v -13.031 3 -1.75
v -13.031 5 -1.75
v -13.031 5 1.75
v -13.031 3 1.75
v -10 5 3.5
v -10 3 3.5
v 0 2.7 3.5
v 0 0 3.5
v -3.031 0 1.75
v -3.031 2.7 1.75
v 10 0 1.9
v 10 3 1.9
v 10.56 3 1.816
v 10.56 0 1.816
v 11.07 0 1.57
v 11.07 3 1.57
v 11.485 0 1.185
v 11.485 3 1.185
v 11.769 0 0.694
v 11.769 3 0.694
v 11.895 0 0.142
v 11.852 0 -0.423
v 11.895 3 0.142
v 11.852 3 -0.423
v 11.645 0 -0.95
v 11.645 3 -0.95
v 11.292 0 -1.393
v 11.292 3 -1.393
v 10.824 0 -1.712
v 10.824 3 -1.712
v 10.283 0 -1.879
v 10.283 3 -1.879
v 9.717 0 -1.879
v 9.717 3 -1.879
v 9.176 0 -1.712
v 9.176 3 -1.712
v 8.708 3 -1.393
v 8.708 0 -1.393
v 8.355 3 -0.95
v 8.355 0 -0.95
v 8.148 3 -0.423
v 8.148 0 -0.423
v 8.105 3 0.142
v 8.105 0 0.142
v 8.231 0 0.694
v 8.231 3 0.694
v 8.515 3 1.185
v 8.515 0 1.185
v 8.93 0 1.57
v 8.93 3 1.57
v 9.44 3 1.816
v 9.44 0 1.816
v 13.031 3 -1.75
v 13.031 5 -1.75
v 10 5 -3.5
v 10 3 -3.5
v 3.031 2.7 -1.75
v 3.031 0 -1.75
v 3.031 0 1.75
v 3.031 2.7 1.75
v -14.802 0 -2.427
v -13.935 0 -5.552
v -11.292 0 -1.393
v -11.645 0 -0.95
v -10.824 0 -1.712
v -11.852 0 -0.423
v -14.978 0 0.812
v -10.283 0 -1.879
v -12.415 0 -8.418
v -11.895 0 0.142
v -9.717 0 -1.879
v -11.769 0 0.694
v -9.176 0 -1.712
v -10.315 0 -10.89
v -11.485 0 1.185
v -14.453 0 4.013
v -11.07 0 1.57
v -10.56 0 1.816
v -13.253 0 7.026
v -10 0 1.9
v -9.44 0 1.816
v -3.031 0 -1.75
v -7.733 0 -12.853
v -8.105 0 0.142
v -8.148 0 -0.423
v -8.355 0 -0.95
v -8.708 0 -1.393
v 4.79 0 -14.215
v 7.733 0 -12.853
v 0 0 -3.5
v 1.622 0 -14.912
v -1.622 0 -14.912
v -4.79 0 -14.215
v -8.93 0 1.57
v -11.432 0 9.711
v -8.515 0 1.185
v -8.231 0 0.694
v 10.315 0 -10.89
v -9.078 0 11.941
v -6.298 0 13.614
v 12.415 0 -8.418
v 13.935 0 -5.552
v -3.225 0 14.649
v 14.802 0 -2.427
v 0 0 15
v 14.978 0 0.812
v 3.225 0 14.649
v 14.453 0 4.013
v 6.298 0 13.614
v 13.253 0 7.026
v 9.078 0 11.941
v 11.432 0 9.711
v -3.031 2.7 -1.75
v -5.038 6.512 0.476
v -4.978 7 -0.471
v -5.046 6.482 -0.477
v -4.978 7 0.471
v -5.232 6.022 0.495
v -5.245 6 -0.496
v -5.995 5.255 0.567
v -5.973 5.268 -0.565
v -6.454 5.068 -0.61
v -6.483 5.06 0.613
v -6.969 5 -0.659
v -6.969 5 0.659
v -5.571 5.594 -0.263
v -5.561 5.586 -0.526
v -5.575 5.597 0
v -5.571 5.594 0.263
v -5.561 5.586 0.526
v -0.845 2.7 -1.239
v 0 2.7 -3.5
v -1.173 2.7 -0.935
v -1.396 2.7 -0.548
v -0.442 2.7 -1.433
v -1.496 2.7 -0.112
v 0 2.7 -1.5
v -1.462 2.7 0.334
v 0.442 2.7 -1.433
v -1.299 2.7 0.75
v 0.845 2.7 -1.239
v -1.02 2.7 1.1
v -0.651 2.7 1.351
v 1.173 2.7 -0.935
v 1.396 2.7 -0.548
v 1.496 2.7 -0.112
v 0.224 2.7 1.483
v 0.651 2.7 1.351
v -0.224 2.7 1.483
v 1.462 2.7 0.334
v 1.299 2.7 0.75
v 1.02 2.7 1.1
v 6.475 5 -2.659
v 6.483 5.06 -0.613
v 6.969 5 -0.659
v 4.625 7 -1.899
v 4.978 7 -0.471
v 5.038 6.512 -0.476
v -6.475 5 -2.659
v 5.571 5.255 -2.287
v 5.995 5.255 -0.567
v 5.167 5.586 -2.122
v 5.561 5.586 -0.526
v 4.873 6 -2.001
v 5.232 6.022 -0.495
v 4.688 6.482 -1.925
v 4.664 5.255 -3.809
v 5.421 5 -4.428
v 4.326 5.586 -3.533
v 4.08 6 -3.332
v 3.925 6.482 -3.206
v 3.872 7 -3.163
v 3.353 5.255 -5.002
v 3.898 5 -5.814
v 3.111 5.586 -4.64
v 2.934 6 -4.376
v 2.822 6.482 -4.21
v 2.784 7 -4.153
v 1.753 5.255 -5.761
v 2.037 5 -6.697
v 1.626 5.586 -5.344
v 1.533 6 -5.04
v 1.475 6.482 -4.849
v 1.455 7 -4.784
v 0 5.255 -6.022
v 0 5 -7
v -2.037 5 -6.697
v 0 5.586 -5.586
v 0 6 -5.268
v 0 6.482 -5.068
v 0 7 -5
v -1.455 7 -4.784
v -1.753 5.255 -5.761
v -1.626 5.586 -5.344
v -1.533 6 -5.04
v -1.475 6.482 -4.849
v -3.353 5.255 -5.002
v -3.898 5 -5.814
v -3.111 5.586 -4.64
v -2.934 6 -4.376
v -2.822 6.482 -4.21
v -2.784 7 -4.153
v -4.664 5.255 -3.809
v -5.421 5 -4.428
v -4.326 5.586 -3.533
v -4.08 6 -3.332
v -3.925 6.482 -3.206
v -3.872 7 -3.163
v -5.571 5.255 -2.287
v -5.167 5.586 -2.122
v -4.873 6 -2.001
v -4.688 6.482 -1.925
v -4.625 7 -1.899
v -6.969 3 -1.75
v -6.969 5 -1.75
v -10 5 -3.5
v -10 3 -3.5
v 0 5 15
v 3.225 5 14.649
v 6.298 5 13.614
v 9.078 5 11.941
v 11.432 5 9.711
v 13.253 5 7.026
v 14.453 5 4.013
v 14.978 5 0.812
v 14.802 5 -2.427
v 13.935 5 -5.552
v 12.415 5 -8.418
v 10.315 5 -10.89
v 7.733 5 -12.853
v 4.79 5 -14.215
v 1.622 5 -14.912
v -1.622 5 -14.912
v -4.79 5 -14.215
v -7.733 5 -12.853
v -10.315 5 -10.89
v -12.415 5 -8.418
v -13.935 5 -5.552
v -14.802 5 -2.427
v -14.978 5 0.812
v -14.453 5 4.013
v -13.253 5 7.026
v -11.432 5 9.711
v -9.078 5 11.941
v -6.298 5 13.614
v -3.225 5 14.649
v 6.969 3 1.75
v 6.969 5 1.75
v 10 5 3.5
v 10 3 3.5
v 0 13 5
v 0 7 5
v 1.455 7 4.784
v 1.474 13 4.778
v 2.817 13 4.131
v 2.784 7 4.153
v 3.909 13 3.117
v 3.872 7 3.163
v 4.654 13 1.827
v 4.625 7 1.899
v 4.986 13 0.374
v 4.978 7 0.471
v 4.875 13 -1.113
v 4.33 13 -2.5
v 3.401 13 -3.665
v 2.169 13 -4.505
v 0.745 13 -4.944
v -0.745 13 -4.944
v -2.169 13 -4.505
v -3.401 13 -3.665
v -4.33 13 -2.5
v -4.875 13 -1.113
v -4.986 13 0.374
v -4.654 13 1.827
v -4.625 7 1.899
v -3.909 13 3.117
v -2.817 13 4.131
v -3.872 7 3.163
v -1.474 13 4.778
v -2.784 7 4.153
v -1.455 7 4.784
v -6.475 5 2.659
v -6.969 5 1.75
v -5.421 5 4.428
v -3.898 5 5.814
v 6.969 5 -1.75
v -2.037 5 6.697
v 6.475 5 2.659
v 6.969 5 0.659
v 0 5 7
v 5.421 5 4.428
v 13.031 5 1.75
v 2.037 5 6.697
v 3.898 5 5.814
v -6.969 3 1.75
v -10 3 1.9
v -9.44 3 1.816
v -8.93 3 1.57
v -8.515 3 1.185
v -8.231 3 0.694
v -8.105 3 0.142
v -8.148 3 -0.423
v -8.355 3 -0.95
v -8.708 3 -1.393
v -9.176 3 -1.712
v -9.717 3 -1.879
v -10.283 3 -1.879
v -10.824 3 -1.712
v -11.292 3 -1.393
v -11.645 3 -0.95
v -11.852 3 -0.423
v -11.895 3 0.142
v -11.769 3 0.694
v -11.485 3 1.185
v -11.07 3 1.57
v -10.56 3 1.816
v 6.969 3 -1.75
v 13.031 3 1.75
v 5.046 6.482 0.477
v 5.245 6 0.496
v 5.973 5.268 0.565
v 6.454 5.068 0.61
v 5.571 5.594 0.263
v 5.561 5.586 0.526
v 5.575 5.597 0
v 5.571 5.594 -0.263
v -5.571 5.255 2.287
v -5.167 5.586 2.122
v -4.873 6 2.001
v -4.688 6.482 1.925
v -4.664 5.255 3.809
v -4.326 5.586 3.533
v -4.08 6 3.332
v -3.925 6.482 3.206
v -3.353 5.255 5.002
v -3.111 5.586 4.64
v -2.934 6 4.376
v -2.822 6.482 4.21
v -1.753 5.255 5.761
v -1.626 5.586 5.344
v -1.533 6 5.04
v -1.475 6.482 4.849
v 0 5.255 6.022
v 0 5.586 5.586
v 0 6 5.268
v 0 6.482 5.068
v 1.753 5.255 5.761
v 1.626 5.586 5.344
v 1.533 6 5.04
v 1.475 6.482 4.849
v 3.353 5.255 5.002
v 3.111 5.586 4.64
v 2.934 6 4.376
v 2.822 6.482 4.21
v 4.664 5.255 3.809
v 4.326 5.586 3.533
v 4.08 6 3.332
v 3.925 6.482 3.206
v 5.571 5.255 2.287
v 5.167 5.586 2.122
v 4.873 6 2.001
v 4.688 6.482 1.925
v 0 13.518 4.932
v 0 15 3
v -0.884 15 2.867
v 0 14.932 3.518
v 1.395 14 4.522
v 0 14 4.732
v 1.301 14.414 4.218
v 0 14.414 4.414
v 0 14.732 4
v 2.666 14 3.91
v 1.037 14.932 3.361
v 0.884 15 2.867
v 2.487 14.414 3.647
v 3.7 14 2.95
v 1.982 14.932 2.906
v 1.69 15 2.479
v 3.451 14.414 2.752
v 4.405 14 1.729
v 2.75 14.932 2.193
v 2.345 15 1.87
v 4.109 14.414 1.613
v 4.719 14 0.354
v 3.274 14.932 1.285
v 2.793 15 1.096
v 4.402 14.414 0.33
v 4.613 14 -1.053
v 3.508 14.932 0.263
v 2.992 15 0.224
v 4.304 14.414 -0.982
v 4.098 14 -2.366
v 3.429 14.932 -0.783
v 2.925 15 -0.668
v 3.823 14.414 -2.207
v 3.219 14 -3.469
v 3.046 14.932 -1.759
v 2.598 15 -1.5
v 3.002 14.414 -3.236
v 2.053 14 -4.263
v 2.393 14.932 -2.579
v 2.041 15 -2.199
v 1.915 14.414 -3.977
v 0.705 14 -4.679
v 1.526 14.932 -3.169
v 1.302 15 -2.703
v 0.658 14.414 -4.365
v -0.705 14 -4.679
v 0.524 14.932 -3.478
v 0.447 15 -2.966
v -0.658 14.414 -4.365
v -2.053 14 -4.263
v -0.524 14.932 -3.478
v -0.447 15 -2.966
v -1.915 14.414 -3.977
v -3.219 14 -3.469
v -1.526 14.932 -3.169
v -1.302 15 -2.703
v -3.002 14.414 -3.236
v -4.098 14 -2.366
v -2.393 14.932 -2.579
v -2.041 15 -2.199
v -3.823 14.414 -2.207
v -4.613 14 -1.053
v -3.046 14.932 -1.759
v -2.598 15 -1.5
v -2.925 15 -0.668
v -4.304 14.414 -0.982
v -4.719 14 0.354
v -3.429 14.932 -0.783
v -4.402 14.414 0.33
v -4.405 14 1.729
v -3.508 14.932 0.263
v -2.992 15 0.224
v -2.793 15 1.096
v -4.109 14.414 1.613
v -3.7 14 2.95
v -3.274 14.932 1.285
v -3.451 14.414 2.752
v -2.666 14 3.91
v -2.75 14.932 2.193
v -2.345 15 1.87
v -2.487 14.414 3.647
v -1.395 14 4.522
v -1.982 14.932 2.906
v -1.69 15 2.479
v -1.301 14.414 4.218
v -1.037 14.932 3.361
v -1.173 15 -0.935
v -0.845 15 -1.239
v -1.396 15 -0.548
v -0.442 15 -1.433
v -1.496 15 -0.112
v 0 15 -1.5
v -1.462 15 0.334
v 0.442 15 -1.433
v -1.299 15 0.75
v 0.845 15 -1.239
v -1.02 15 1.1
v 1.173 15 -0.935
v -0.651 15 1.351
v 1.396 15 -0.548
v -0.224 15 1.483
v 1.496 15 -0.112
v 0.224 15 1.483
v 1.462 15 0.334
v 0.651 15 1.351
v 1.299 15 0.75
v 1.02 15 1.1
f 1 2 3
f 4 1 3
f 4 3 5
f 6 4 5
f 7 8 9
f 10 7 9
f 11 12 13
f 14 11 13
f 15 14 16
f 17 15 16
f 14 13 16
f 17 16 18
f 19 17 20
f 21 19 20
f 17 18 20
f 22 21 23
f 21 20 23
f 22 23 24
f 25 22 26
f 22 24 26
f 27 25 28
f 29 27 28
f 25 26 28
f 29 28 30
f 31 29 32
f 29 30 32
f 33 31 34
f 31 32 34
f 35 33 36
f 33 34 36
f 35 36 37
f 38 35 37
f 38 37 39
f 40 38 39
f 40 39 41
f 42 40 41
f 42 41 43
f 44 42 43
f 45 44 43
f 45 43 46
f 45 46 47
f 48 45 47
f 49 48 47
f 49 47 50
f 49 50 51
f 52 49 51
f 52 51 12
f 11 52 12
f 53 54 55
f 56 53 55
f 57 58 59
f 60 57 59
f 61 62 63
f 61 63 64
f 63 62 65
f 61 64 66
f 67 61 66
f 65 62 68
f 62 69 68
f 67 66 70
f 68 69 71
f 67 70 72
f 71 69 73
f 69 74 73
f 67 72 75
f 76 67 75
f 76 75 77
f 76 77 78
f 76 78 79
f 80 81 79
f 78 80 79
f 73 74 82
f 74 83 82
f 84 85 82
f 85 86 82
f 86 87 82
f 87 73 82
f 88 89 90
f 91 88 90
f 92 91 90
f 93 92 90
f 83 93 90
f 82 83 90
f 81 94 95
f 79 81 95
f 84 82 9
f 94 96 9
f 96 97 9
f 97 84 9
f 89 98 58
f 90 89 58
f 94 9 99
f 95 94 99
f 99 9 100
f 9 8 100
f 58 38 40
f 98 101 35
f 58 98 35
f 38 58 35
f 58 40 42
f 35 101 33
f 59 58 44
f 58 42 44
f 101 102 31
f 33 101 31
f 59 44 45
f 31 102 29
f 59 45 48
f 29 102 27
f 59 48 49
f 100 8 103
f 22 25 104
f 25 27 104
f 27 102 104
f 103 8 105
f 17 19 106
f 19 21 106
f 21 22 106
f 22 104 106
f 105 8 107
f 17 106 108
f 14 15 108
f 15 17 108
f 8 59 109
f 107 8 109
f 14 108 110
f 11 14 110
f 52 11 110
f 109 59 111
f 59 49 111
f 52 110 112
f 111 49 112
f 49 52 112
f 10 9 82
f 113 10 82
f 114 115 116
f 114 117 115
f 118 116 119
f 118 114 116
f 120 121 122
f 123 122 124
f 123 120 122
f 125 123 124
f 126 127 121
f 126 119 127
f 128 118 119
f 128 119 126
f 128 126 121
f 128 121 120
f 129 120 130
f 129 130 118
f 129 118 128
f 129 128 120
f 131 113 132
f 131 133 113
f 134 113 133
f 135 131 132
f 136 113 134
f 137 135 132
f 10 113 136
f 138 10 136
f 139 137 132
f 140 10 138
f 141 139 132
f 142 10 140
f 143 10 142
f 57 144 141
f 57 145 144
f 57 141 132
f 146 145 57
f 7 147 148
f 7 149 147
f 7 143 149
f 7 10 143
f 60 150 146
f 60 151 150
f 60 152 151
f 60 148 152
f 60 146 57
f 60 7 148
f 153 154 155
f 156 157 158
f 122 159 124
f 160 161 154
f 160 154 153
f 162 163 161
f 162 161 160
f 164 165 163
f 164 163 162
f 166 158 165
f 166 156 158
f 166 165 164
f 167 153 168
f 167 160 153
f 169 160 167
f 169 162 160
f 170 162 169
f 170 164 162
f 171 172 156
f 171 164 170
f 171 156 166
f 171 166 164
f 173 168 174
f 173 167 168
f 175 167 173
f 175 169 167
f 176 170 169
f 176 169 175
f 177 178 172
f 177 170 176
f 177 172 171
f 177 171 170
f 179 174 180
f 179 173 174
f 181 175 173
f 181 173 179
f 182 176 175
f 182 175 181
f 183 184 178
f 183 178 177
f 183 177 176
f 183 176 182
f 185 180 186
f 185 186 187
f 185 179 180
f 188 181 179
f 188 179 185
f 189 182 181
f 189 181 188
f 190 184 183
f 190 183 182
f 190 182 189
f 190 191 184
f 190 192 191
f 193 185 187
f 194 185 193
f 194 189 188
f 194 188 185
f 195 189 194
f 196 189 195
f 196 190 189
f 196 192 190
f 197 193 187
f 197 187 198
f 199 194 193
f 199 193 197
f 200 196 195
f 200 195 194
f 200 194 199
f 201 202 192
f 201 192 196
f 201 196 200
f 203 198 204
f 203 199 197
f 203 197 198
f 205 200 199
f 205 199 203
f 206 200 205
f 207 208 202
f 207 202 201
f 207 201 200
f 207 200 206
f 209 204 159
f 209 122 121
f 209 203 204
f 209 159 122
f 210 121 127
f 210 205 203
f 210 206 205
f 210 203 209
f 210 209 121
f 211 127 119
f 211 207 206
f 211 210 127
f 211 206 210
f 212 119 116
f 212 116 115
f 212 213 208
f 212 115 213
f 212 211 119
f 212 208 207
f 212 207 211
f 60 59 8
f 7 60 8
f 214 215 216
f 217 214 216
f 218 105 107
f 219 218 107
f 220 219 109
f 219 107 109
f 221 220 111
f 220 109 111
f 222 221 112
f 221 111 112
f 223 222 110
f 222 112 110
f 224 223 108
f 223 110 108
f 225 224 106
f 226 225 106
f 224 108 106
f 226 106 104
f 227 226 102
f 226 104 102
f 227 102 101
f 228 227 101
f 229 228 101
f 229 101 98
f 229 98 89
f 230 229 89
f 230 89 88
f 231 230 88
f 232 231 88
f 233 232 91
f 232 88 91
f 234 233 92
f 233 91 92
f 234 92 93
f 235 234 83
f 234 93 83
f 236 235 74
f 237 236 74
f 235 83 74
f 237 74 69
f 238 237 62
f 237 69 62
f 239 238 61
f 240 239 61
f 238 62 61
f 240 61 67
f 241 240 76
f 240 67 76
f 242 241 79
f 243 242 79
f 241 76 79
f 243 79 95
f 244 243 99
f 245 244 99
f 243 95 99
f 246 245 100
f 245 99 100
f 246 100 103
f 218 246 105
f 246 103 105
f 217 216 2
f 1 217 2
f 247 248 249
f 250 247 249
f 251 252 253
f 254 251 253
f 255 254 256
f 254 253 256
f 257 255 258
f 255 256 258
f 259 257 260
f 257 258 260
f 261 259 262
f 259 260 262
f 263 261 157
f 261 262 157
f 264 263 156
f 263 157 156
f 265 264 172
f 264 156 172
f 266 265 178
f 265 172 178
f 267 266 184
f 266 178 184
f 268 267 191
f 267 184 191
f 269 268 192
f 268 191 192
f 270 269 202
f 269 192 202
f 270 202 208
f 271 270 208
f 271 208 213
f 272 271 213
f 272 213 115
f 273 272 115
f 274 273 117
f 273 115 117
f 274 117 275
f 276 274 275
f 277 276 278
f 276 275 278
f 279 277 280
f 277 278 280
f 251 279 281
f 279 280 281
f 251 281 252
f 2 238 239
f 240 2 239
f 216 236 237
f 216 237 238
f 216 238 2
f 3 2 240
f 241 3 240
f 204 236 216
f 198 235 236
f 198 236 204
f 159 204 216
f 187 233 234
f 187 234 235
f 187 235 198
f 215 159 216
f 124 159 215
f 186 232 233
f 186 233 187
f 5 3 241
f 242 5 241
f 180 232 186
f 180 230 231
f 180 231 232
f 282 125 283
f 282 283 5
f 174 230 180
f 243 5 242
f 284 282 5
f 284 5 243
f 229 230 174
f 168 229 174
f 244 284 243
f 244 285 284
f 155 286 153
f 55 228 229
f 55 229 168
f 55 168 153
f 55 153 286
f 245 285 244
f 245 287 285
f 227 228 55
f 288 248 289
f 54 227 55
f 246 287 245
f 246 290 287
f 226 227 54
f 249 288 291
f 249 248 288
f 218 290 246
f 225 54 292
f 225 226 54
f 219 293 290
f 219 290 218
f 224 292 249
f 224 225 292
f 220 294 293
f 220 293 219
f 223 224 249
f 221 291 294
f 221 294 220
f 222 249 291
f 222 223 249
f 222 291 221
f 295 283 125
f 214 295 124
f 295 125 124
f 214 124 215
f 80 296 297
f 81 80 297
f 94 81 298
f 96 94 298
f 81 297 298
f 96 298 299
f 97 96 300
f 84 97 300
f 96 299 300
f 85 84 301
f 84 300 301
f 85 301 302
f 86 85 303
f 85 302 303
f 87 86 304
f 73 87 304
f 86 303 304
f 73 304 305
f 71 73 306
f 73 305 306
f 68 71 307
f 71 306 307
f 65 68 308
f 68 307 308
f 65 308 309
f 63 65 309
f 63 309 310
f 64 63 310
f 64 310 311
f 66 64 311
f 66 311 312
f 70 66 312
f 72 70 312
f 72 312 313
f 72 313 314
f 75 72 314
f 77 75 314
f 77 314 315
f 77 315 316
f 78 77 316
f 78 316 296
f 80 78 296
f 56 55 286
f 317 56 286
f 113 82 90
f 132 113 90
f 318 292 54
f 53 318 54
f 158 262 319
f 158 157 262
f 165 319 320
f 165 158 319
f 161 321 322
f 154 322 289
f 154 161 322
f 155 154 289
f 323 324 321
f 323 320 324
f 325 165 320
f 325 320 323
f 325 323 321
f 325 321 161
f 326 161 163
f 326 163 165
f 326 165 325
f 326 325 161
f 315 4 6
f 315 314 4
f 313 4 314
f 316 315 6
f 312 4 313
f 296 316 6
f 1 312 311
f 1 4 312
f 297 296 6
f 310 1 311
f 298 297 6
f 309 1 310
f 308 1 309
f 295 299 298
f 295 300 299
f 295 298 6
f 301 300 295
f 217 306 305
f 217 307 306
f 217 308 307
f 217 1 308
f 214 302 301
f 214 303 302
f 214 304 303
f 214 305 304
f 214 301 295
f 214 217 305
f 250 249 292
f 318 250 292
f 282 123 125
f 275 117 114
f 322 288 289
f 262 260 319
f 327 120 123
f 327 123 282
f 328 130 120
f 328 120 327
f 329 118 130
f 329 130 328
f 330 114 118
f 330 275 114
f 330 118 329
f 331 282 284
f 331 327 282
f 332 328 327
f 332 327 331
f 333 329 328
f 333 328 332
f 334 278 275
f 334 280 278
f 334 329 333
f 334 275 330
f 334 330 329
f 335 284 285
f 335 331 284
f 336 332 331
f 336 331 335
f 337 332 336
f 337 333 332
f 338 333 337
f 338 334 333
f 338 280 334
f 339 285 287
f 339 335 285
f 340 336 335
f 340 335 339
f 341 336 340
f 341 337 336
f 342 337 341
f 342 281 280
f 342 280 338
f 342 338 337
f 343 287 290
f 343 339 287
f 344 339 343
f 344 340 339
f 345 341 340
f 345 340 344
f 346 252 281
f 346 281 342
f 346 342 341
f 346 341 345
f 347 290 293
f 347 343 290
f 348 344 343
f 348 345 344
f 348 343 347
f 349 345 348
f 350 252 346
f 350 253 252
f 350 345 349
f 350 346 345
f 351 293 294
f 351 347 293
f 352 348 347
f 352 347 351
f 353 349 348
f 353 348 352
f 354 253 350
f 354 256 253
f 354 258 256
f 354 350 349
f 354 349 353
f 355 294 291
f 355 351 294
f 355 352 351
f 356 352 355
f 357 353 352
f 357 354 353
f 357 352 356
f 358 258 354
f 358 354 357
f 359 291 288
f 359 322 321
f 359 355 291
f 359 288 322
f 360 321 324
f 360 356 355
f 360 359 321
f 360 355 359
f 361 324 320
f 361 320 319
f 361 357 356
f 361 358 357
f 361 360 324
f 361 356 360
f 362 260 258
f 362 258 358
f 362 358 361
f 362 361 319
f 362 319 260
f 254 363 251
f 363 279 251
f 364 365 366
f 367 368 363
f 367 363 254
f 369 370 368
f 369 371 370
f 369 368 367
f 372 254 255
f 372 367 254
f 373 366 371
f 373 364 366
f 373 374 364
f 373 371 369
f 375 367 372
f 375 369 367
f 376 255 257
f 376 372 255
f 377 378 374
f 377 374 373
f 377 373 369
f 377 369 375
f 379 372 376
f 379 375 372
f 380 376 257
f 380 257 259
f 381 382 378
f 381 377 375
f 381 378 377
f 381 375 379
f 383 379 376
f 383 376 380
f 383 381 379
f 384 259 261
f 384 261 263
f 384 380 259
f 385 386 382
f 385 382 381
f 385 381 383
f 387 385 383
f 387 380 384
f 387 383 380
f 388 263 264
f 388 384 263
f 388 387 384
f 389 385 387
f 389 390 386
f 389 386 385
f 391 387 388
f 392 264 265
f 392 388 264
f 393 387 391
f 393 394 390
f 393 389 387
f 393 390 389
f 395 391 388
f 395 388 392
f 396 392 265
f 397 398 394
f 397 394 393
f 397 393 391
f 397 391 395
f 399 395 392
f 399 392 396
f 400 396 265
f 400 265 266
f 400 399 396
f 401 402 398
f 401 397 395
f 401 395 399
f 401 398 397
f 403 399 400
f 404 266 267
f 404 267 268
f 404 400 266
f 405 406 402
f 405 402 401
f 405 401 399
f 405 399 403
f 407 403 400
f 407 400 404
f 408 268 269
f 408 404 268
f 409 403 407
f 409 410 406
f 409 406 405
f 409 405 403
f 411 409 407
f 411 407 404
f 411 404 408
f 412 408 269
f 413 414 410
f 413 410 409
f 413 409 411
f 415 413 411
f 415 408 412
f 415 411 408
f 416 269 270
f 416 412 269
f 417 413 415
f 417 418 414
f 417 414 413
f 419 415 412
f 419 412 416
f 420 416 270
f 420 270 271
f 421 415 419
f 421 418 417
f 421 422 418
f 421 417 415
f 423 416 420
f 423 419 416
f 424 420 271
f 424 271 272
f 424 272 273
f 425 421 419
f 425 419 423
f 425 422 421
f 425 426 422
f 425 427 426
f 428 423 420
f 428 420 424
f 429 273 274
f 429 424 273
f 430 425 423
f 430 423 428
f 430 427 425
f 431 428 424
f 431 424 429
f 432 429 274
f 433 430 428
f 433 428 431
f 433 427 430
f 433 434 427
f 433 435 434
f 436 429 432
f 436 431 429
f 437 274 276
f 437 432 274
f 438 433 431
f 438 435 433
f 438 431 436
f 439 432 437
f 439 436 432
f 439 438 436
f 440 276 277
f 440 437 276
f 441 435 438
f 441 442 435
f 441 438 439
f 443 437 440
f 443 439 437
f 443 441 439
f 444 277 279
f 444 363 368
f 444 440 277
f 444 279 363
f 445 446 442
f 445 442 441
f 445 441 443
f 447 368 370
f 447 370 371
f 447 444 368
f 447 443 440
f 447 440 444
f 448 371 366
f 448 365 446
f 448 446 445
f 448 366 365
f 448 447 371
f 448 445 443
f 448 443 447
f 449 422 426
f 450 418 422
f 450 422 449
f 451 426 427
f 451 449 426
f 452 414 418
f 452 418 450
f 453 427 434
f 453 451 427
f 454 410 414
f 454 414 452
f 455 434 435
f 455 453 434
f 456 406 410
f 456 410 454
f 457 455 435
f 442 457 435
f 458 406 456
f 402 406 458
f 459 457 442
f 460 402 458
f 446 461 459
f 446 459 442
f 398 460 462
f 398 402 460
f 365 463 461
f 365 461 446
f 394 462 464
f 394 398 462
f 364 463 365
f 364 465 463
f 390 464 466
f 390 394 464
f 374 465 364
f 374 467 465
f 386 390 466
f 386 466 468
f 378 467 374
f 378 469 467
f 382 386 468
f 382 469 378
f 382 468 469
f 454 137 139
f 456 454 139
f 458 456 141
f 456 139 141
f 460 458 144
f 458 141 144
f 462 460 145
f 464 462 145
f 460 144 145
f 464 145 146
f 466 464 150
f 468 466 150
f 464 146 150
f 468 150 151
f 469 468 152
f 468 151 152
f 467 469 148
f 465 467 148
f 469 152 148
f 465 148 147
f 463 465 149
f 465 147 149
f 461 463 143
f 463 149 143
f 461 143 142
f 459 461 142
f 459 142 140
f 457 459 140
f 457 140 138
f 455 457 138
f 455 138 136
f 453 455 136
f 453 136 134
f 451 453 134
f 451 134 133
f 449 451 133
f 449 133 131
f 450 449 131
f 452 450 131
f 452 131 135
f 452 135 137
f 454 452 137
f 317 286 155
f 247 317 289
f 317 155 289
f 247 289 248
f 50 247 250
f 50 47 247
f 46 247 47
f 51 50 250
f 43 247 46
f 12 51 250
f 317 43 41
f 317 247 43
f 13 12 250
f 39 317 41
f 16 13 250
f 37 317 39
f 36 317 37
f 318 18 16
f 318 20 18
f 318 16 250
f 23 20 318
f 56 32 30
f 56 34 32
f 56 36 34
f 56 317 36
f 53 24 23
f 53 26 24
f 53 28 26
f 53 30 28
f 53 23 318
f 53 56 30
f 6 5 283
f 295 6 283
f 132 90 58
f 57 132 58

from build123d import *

# Parameters (mm, degrees)
SKETCH_1_R          = 15
EXTRUDE_1_DEPTH     = 5
SKETCH_2_R          = 1.9
CUT_EXTRUDE_1_DEPTH = 5
CUT_EXTRUDE_2_DEPTH = 2
SKETCH_4_R          = 5
EXTRUDE_2_DEPTH     = 10
FILLET_1_R          = 2
SKETCH_5_R          = 1.5
CUT_EXTRUDE_3_DEPTH = 15
CUT_EXTRUDE_4_DEPTH = 2.7


with BuildPart() as part:
    # Эскиз1 → Бобышка-Вытянуть1 (new body)
    with BuildSketch(Plane(origin=(0, 0, 0), x_dir=(1, 0, 0), z_dir=(0, 1, 0))):
        with Locations(Location((0, 0, 0), (0, 0, 270))):
            Circle(SKETCH_1_R)
    extrude(amount=EXTRUDE_1_DEPTH)

    # Эскиз2 → Вырез-Вытянуть1 (cut)
    with BuildSketch(Plane(origin=(0, 5, 0), x_dir=(1, 0, 0), z_dir=(0, 1, 0))):
        with Locations(Location((-10, 0, 0), (0, 0, 270))):
            Circle(SKETCH_2_R)
        with Locations(Location((10, 0, 0), (0, 0, 270))):
            Circle(SKETCH_2_R)
    extrude(amount=-CUT_EXTRUDE_1_DEPTH, mode=Mode.SUBTRACT)

    # Эскиз3 → Вырез-Вытянуть2 (cut)
    with BuildSketch(Plane(origin=(0, 5, 0), x_dir=(1, 0, 0), z_dir=(0, 1, 0))):
        Polygon((-10, -3.5), (-6.968911087, -1.75), (-6.968911087, 1.75), (-10, 3.5), (-13.031088913, 1.75), (-13.031088913, -1.75), align=None)
        Polygon((10, -3.5), (13.031088913, -1.75), (13.031088913, 1.75), (10, 3.5), (6.968911087, 1.75), (6.968911087, -1.75), align=None)
    extrude(amount=-CUT_EXTRUDE_2_DEPTH, mode=Mode.SUBTRACT)

    # Эскиз4 → Бобышка-Вытянуть2 (add)
    with BuildSketch(Plane(origin=(0, 5, 0), x_dir=(1, 0, 0), z_dir=(0, 1, 0))):
        with Locations(Location((0, 0, 0), (0, 0, 270))):
            Circle(SKETCH_4_R)
    extrude(amount=EXTRUDE_2_DEPTH)

    # Скругление1
    fillet_1_edges = [part.edges().sort_by_distance(p)[0] for p in [
        (0, 5, -5),
        (0, 15, -5),
    ]]
    fillet(fillet_1_edges, radius=FILLET_1_R)

    # Эскиз5 → Вырез-Вытянуть3 (cut)
    with BuildSketch(Plane.XZ):
        with Locations(Location((0, 0, 0), (0, 0, 270))):
            Circle(SKETCH_5_R)
    extrude(amount=-CUT_EXTRUDE_3_DEPTH, mode=Mode.SUBTRACT)

    # Эскиз6 → Вырез-Вытянуть4 (cut)
    with BuildSketch(Plane.XZ):
        Polygon((0, 3.5), (-3.031088913, 1.75), (-3.031088913, -1.75), (0, -3.5), (3.031088913, -1.75), (3.031088913, 1.75), align=None)
    extrude(amount=-CUT_EXTRUDE_4_DEPTH, mode=Mode.SUBTRACT)


solid = part.part
